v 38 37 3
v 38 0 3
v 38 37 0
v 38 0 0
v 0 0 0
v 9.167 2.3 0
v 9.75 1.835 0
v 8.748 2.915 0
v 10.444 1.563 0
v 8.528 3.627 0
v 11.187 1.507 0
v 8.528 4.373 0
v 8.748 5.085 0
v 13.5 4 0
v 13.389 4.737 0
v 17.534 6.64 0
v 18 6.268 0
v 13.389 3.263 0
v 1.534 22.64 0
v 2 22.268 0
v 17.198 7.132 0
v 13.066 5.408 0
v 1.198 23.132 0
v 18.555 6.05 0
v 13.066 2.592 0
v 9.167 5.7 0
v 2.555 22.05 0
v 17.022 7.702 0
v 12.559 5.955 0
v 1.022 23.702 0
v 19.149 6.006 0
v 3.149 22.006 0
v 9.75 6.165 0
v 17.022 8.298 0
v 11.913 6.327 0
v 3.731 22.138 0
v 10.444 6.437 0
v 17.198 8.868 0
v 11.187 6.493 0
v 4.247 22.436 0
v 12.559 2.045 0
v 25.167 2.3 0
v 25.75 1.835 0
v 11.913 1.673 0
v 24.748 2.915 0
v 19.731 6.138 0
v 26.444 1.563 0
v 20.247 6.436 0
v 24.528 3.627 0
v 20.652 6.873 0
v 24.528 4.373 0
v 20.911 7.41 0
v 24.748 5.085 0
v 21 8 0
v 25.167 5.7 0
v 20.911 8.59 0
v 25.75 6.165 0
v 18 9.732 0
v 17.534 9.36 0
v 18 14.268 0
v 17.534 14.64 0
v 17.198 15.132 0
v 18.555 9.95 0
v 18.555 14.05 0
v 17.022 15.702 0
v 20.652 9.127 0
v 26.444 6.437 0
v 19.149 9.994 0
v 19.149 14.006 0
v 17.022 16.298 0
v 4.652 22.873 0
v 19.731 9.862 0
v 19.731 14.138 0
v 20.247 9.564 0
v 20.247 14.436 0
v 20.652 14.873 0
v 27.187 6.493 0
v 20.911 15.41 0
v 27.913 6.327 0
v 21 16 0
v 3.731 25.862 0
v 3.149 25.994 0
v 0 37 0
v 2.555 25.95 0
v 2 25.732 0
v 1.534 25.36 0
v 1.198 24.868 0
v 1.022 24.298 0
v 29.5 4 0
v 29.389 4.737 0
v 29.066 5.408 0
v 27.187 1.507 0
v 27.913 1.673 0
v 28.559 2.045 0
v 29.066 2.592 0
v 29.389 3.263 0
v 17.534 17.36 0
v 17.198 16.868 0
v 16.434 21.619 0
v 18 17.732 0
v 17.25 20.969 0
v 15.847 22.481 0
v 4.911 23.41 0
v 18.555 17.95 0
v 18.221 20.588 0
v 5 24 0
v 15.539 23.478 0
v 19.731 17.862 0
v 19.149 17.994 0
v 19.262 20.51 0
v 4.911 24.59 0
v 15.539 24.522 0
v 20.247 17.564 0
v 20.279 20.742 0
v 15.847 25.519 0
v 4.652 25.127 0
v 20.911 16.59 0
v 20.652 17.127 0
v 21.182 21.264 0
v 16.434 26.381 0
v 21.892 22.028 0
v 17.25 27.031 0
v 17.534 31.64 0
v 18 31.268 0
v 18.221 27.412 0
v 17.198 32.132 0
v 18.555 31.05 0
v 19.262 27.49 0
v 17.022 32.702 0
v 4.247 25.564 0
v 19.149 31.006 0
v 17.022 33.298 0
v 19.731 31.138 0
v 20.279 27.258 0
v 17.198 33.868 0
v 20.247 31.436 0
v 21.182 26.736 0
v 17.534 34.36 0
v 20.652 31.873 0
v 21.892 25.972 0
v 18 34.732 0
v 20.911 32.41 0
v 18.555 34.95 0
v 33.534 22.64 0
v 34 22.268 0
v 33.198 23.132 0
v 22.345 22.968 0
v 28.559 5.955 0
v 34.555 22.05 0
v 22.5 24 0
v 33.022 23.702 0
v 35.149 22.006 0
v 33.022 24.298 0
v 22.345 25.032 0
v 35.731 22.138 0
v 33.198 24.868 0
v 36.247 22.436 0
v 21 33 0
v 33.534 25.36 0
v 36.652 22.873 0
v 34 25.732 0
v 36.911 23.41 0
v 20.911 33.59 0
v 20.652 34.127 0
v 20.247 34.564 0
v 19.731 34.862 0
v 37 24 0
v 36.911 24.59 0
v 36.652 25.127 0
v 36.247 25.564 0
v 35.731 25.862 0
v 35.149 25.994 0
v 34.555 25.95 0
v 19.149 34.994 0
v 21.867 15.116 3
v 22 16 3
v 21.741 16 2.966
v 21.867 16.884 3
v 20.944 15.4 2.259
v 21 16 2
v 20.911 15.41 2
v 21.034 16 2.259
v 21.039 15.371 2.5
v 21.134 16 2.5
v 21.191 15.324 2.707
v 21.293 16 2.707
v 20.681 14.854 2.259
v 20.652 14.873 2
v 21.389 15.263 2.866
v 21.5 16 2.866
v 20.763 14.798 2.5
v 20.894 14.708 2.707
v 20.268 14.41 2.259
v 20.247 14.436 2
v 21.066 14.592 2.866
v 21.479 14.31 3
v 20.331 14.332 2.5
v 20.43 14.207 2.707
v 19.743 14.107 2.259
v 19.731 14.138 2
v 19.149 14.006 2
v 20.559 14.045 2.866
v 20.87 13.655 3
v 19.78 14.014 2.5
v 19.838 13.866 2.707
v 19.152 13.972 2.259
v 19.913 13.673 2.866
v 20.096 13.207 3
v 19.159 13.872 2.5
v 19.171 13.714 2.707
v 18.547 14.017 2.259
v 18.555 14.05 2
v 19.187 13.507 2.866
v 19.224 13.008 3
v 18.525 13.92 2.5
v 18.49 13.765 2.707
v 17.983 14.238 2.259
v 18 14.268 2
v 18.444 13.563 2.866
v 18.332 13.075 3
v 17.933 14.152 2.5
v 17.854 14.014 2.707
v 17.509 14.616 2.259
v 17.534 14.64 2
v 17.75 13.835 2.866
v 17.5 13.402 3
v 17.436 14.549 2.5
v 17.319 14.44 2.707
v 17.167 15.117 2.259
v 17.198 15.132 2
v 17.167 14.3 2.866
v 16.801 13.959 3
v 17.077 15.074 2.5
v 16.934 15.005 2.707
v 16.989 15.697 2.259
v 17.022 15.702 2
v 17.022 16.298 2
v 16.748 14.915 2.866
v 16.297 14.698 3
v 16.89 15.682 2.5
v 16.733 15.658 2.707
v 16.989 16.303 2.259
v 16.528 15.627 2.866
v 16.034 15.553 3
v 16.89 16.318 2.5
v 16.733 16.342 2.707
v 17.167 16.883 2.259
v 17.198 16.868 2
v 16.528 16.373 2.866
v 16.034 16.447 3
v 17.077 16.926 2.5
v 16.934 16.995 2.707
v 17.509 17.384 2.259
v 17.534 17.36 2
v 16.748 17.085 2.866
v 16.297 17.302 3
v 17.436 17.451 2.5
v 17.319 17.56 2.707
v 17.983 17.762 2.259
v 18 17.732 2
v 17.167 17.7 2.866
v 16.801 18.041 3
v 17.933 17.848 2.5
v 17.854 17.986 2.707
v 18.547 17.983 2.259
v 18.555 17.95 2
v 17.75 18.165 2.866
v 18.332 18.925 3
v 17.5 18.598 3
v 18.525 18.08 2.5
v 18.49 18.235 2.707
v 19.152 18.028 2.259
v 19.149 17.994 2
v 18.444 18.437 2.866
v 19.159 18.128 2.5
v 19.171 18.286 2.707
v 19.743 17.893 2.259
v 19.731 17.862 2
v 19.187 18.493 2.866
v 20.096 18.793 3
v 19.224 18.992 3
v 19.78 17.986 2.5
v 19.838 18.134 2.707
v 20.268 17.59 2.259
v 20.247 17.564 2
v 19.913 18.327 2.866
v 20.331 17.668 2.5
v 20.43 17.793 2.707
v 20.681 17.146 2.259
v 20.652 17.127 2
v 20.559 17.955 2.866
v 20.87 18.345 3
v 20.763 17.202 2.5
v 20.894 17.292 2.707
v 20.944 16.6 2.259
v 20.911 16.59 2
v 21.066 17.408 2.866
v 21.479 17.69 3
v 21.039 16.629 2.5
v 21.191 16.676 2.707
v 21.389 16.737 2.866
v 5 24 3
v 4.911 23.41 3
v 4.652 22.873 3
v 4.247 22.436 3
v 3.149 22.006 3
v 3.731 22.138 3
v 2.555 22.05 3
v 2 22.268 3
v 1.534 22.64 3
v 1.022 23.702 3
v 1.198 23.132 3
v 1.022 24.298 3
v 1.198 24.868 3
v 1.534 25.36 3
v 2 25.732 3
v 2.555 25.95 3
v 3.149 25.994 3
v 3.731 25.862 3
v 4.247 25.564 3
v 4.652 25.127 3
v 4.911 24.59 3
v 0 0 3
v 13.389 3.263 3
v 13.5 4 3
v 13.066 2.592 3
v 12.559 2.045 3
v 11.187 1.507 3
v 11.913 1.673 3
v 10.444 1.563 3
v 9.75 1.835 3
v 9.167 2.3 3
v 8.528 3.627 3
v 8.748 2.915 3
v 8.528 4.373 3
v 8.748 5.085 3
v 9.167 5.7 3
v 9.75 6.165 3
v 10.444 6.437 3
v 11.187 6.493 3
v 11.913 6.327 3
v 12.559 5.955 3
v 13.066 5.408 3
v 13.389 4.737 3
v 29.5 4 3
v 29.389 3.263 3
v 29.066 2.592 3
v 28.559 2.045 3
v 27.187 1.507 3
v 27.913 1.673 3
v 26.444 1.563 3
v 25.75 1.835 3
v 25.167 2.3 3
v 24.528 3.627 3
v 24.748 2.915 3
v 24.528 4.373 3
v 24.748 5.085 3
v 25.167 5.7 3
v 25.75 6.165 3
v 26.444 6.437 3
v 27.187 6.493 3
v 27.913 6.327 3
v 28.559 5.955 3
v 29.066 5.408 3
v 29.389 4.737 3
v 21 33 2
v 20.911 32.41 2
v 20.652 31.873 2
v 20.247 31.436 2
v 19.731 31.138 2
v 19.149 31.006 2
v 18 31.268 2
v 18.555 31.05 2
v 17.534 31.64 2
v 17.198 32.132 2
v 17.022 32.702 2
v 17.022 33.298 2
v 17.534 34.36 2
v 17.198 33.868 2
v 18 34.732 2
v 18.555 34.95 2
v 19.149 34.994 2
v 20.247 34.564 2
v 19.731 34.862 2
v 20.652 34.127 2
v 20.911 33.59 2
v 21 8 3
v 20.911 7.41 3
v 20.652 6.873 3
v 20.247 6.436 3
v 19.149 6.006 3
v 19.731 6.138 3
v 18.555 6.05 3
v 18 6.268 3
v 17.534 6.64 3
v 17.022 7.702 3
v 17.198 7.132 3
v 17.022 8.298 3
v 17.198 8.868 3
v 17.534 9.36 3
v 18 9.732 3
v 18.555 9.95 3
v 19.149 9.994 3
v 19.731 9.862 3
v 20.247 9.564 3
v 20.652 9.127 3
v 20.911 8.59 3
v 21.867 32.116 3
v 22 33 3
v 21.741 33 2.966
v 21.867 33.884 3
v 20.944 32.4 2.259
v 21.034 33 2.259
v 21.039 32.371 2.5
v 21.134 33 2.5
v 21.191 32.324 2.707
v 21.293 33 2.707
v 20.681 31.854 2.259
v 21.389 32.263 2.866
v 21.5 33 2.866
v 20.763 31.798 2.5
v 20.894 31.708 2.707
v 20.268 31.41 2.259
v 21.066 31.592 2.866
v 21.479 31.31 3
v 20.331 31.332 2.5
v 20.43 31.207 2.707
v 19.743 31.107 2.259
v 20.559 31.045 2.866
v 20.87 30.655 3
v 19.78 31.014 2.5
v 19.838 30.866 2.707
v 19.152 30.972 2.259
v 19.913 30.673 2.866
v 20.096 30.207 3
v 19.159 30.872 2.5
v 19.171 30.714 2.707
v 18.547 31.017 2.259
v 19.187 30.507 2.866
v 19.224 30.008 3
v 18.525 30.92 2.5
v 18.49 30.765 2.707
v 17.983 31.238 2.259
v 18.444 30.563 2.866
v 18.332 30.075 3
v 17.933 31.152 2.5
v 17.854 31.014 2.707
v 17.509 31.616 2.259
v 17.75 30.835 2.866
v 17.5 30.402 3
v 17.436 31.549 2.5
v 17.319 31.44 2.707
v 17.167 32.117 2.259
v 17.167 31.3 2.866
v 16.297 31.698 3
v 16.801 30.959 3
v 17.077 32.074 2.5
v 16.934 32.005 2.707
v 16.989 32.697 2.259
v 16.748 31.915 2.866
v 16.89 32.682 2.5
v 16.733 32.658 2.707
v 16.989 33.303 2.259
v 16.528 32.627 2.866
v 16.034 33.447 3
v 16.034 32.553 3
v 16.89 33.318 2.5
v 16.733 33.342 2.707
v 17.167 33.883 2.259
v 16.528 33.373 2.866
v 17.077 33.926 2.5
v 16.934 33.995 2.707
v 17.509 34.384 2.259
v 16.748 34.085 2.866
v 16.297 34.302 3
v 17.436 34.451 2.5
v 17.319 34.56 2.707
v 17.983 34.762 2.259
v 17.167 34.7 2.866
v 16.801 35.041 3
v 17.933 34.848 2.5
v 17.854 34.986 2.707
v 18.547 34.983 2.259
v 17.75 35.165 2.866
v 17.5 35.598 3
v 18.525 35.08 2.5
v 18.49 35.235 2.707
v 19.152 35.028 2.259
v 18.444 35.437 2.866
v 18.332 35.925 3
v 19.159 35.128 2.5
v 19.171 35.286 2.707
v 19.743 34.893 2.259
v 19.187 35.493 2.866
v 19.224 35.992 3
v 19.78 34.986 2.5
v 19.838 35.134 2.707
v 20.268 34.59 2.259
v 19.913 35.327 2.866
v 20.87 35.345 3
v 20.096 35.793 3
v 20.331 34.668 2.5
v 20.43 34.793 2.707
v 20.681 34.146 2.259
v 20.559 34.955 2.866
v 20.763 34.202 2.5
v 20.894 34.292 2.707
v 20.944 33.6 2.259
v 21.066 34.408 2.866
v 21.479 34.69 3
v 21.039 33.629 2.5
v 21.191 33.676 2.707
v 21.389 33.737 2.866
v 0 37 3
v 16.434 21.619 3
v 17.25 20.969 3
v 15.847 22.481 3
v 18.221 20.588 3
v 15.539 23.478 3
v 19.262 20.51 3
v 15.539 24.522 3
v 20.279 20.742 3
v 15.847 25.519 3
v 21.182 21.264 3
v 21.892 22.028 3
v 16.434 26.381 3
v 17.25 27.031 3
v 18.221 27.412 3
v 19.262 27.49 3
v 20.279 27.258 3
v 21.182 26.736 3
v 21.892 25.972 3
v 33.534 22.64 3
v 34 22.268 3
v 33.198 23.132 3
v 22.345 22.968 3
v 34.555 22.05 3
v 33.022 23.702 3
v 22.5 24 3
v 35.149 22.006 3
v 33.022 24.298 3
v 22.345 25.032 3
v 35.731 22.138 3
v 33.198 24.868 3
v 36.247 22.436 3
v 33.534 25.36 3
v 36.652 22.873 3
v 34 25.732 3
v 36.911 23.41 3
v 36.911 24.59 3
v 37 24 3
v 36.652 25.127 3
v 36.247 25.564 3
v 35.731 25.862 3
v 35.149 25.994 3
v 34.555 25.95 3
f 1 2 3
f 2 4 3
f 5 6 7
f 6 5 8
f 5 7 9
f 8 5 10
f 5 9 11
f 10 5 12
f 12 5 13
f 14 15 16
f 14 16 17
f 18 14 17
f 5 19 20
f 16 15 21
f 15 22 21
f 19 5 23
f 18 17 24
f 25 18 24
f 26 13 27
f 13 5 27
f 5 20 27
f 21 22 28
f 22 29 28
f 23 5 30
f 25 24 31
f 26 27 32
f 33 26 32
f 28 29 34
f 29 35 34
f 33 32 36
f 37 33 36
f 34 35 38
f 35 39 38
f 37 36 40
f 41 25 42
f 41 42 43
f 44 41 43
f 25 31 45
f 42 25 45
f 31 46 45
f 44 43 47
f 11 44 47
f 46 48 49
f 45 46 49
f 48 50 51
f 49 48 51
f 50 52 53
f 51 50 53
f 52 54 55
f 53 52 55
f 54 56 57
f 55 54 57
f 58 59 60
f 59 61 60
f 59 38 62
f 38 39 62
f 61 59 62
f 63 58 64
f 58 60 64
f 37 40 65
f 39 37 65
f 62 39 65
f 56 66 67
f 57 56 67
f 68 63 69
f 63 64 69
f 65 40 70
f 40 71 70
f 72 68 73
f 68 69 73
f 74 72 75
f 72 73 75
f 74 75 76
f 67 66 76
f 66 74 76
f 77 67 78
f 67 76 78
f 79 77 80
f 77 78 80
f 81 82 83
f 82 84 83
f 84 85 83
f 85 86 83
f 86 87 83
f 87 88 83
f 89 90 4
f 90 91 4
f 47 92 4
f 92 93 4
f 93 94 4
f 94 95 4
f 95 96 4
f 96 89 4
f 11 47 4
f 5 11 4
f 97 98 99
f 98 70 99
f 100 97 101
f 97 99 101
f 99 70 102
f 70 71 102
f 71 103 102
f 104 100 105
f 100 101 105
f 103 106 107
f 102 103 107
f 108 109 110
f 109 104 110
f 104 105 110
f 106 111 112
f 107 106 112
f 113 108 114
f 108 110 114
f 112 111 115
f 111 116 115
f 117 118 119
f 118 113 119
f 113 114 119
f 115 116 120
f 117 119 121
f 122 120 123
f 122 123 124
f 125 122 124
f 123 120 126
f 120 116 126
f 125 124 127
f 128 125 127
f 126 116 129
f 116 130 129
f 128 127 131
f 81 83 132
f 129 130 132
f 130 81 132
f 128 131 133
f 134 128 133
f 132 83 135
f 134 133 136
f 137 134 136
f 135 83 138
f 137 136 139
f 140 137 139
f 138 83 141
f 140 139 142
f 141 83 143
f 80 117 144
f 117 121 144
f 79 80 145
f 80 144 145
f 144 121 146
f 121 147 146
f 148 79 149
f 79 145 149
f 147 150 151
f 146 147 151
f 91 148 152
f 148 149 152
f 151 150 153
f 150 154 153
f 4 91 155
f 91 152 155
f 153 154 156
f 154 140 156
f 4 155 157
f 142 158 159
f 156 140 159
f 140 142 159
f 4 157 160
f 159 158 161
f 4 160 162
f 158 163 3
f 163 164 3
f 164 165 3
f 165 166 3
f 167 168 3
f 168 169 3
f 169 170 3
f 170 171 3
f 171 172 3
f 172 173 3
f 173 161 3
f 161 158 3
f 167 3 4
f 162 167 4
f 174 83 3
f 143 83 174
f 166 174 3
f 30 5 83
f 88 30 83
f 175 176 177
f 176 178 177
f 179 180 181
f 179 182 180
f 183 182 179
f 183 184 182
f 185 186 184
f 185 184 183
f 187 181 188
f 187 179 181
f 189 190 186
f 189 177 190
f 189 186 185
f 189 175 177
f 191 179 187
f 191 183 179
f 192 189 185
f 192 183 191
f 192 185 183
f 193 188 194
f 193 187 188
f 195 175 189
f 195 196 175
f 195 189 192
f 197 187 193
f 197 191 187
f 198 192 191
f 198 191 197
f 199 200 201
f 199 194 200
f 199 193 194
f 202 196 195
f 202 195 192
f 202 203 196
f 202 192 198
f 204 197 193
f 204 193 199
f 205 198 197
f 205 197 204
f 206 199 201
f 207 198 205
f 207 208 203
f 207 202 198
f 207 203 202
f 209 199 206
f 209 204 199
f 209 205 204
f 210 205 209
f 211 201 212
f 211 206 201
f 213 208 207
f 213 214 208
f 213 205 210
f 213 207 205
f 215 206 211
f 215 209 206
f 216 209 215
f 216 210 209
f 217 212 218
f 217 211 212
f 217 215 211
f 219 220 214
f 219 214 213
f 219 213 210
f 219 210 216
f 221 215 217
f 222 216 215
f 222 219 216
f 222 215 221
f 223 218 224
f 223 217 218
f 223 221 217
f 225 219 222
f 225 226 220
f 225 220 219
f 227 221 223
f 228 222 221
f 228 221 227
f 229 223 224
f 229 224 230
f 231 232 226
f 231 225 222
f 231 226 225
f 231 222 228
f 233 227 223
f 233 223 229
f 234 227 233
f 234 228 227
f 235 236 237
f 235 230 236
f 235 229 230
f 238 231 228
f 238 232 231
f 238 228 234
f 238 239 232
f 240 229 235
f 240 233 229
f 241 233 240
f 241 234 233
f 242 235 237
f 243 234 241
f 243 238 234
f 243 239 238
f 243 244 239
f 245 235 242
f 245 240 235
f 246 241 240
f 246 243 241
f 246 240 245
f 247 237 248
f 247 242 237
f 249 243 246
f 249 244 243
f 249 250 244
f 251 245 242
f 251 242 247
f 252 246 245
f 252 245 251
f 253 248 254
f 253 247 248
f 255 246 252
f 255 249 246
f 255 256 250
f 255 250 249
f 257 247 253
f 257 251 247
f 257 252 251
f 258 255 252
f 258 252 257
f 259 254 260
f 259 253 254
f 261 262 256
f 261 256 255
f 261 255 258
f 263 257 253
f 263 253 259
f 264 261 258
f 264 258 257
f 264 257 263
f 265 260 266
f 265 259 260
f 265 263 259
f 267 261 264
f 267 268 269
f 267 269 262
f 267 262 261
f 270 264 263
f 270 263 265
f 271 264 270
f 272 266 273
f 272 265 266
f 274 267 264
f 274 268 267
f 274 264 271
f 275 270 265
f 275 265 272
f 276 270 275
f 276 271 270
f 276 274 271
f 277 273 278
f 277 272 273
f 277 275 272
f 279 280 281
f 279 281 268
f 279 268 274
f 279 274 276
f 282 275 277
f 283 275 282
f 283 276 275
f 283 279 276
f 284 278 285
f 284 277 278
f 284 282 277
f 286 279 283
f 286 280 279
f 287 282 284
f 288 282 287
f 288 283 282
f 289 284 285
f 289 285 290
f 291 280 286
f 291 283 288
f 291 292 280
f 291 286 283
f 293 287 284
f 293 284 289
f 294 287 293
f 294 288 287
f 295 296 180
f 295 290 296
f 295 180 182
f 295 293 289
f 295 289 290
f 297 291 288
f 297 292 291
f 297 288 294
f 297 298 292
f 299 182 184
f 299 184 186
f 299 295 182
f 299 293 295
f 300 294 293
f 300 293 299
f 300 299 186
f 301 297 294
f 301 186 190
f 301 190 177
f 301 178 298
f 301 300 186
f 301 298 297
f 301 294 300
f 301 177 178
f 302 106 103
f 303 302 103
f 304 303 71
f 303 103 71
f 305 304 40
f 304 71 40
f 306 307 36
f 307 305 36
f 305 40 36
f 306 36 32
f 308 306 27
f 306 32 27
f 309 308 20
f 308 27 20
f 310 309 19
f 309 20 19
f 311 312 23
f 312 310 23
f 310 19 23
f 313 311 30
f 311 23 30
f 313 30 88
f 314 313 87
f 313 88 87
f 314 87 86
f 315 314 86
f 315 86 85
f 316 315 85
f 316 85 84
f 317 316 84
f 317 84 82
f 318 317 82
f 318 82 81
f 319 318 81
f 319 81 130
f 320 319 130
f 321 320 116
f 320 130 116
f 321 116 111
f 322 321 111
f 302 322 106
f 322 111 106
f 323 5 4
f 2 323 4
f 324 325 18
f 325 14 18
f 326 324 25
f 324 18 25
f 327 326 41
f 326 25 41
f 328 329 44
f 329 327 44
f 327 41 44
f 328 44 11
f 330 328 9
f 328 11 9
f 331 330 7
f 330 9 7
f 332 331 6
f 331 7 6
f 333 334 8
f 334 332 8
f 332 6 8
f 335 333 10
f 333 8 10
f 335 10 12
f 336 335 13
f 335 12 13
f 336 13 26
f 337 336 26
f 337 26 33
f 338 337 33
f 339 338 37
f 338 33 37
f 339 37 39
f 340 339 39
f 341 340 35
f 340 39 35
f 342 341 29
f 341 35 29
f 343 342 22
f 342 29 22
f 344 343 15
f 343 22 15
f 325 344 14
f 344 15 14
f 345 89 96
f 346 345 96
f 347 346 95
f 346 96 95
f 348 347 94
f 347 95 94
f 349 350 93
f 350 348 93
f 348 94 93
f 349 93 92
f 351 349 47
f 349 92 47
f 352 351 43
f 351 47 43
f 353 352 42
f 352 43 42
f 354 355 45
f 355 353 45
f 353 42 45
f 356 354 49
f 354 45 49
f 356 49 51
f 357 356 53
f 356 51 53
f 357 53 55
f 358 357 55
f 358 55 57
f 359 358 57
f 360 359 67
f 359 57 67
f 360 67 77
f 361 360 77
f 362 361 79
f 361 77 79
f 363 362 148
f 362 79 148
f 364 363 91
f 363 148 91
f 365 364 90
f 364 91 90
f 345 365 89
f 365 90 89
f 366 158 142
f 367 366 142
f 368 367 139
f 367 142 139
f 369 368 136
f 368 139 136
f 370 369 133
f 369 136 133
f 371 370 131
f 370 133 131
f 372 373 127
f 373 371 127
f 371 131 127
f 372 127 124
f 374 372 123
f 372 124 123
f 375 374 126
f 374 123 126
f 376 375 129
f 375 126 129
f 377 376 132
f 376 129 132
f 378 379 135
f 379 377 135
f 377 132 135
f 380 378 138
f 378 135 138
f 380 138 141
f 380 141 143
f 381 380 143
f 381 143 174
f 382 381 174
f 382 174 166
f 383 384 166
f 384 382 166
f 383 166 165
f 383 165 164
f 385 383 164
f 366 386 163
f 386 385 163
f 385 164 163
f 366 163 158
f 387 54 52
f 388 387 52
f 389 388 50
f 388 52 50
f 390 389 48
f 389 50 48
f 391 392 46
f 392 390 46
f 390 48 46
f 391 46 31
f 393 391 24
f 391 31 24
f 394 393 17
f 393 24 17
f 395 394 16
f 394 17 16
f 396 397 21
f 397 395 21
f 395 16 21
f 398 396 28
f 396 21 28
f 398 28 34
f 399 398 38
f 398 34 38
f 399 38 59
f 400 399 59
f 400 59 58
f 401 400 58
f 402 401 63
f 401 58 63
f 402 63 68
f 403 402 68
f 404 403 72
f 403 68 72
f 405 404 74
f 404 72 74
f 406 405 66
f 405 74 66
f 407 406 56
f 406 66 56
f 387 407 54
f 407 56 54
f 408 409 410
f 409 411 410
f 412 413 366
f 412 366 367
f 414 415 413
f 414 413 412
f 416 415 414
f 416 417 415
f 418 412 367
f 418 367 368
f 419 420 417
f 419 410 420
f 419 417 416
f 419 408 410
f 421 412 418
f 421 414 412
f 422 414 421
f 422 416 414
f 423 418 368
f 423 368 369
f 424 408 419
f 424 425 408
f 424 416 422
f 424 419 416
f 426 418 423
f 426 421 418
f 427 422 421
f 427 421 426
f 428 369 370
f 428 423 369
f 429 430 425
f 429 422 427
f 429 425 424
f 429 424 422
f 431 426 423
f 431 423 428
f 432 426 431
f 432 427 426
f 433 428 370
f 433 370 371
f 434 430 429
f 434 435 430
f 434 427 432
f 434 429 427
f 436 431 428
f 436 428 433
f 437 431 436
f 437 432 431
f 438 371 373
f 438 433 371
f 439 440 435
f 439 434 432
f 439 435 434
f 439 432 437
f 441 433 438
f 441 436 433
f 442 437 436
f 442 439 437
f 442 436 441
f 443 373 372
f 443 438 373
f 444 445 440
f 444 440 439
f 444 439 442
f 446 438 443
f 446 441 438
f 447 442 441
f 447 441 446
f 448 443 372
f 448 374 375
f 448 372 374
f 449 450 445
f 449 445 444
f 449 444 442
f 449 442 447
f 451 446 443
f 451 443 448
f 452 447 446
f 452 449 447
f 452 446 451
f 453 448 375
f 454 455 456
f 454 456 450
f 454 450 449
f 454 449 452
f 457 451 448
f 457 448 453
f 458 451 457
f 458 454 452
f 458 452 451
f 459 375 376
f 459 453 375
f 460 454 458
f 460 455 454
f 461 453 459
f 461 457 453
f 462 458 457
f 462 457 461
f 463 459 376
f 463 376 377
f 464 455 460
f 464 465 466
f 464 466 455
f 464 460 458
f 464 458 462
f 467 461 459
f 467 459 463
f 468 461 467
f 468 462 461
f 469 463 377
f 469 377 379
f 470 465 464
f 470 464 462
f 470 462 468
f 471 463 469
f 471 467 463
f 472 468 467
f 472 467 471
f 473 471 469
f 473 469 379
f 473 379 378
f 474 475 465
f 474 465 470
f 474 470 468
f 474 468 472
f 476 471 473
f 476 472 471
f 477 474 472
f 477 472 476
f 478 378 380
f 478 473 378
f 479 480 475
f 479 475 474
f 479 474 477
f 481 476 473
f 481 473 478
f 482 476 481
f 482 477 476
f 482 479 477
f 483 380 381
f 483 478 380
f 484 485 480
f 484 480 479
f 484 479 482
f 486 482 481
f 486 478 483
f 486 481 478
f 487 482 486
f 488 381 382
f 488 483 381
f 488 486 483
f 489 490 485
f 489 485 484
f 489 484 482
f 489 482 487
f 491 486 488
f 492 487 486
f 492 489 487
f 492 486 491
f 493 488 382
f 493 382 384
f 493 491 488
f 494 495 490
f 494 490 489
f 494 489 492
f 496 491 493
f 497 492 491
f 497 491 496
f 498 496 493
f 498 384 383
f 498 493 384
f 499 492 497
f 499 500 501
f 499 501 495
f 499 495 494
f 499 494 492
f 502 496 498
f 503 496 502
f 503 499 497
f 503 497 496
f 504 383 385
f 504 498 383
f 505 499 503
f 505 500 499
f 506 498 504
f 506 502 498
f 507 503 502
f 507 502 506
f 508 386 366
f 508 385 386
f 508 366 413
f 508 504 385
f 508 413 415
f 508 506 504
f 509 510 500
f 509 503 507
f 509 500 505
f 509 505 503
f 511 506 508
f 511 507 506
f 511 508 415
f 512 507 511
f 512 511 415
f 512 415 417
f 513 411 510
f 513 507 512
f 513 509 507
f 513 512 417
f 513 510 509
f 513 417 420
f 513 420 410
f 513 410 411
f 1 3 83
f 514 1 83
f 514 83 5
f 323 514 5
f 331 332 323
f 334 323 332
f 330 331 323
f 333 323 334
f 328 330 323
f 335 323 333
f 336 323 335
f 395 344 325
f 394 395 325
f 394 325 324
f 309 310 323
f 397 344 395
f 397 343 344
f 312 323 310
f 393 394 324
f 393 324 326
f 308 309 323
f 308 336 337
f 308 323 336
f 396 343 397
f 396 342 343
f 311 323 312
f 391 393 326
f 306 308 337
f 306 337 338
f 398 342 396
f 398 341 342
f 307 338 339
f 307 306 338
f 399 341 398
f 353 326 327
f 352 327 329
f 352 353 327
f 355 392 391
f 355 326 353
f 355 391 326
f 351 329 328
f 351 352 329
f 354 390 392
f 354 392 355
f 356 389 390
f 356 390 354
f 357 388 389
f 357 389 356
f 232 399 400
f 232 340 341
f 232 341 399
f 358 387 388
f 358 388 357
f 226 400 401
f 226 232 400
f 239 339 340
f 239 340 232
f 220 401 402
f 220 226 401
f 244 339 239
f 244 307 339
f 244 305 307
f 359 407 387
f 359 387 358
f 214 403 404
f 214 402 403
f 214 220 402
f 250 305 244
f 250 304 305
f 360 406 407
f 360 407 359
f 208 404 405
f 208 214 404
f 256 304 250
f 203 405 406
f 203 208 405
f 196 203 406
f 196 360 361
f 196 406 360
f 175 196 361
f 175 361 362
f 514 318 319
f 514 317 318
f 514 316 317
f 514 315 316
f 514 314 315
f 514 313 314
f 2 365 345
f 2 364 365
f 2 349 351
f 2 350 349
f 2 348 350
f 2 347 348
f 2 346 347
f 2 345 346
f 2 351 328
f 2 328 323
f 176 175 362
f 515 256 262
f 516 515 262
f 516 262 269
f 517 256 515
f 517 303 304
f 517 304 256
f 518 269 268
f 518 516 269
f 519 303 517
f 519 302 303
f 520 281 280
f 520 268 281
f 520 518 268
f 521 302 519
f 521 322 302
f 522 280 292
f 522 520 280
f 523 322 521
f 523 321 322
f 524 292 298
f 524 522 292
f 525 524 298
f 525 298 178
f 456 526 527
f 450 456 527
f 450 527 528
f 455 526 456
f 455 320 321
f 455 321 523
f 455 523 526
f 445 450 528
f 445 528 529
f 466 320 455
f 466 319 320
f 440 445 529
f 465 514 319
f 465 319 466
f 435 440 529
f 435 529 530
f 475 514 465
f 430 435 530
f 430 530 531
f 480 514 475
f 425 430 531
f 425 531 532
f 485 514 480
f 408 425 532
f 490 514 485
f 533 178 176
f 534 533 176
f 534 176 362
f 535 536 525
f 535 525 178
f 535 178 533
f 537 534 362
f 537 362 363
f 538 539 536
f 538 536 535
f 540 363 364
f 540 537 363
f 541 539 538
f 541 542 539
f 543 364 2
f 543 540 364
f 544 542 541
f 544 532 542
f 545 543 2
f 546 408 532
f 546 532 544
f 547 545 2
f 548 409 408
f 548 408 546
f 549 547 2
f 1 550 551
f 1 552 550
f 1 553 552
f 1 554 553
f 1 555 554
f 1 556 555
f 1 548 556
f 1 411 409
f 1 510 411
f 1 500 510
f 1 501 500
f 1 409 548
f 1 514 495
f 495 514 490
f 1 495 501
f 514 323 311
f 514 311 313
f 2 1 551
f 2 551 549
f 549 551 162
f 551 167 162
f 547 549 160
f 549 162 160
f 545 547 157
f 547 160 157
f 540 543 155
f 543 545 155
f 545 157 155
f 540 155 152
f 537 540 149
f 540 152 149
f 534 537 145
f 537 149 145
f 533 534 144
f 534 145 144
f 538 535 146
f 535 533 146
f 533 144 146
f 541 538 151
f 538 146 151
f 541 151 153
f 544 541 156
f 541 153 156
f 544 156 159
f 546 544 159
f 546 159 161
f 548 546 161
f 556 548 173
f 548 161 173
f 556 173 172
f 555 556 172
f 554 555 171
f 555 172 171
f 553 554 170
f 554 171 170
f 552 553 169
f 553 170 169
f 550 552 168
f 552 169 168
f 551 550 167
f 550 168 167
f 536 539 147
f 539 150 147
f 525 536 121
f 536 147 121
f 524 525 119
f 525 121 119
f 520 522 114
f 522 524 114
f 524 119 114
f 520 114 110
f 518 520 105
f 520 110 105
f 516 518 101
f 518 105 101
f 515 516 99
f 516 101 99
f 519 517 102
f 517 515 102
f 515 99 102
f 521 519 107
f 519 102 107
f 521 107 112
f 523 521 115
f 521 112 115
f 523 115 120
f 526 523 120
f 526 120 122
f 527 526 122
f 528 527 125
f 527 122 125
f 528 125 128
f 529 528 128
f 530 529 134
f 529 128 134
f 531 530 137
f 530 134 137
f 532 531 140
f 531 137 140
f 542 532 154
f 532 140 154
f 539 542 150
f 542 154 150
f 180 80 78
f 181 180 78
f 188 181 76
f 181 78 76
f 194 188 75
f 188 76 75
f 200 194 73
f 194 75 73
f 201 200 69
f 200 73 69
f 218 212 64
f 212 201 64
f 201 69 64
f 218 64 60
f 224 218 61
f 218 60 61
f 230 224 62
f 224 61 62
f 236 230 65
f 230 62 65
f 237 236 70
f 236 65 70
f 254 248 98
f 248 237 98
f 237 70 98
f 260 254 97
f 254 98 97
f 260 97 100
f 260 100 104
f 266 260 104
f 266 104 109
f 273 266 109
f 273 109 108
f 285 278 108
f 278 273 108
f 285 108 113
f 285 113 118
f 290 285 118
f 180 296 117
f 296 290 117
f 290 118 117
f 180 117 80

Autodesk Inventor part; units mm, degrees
ref_plane "YZ Plane" through (0, 0, 0) normal (1, 0, 0) x (0, 1, 0)
ref_plane "XZ Plane" through (0, 0, 0) normal (0, 1, 0) x (-1, 0, 0)
ref_plane "XY Plane" through (0, 0, 0) normal (0, 0, 1) x (1, 0, 0)
sketch "Sketch1" plane through (0, 0, 0) normal (0, 0, 1) x (1, 0, 0)
  line L0 (0, 0) -> (38, 0)
  line L1 (38, 0) -> (38, 37)
  line L2 (38, 37) -> (0, 37)
  line L3 (0, 37) -> (0, 0)
  line L4 (19, 37) -> (19, 0) construction
  circle A0 centre (11, 4) radius 2.5
  circle A1 centre (27, 4) radius 2.5
  circle A2 centre (19, 8) radius 2
  circle A3 centre (19, 16) radius 2
  circle A4 centre (19, 24) radius 3.5
  circle A5 centre (19, 33) radius 2
  circle A6 centre (3, 24) radius 2
  circle A7 centre (35, 24) radius 2
  dimension "d0" = 38
  dimension "d1" = 37
  dimension "d2" = 5
  dimension "d3" = 8
  dimension "d4" = 4
  dimension "d5" = 5
  dimension "d6" = 8
  dimension "d7" = 4
  dimension "d8" = 4
  dimension "d9" = 8
  dimension "d10" = 4
  dimension "d11" = 16
  dimension "d12" = 7
  dimension "d13" = 24
  dimension "d14" = 4
  dimension "d15" = 17
  dimension "d18" = 4
  dimension "d19" = 4
  dimension "d20" = 32
  dimension "d21" = 3
  dimension "d22" = 13
  dimension "d23" = 13
extrude "Extrusion1" add sketch "Sketch1" along normal blind 3
thread "Thread1" size "M4x0.7" class "6H" standard "ISO Metric profile" full length
thread "Thread2" size "M4x0.7" class "6H" standard "ISO Metric profile" full length
thread "Thread3" size "M4x0.7" class "6H" standard "ISO Metric profile" full length
thread "Thread4" size "M4x0.7" class "6H" standard "ISO Metric profile" full length
thread "Thread5" size "M4x0.7" class "6H" standard "ISO Metric profile" full length
fillet "Fillet1" radius 1 2 edges at (17, 33, 3) (17, 16, 3)
properties part number "DC Motor-25 Bracket B-Blue" material "Aluminum 6061"
